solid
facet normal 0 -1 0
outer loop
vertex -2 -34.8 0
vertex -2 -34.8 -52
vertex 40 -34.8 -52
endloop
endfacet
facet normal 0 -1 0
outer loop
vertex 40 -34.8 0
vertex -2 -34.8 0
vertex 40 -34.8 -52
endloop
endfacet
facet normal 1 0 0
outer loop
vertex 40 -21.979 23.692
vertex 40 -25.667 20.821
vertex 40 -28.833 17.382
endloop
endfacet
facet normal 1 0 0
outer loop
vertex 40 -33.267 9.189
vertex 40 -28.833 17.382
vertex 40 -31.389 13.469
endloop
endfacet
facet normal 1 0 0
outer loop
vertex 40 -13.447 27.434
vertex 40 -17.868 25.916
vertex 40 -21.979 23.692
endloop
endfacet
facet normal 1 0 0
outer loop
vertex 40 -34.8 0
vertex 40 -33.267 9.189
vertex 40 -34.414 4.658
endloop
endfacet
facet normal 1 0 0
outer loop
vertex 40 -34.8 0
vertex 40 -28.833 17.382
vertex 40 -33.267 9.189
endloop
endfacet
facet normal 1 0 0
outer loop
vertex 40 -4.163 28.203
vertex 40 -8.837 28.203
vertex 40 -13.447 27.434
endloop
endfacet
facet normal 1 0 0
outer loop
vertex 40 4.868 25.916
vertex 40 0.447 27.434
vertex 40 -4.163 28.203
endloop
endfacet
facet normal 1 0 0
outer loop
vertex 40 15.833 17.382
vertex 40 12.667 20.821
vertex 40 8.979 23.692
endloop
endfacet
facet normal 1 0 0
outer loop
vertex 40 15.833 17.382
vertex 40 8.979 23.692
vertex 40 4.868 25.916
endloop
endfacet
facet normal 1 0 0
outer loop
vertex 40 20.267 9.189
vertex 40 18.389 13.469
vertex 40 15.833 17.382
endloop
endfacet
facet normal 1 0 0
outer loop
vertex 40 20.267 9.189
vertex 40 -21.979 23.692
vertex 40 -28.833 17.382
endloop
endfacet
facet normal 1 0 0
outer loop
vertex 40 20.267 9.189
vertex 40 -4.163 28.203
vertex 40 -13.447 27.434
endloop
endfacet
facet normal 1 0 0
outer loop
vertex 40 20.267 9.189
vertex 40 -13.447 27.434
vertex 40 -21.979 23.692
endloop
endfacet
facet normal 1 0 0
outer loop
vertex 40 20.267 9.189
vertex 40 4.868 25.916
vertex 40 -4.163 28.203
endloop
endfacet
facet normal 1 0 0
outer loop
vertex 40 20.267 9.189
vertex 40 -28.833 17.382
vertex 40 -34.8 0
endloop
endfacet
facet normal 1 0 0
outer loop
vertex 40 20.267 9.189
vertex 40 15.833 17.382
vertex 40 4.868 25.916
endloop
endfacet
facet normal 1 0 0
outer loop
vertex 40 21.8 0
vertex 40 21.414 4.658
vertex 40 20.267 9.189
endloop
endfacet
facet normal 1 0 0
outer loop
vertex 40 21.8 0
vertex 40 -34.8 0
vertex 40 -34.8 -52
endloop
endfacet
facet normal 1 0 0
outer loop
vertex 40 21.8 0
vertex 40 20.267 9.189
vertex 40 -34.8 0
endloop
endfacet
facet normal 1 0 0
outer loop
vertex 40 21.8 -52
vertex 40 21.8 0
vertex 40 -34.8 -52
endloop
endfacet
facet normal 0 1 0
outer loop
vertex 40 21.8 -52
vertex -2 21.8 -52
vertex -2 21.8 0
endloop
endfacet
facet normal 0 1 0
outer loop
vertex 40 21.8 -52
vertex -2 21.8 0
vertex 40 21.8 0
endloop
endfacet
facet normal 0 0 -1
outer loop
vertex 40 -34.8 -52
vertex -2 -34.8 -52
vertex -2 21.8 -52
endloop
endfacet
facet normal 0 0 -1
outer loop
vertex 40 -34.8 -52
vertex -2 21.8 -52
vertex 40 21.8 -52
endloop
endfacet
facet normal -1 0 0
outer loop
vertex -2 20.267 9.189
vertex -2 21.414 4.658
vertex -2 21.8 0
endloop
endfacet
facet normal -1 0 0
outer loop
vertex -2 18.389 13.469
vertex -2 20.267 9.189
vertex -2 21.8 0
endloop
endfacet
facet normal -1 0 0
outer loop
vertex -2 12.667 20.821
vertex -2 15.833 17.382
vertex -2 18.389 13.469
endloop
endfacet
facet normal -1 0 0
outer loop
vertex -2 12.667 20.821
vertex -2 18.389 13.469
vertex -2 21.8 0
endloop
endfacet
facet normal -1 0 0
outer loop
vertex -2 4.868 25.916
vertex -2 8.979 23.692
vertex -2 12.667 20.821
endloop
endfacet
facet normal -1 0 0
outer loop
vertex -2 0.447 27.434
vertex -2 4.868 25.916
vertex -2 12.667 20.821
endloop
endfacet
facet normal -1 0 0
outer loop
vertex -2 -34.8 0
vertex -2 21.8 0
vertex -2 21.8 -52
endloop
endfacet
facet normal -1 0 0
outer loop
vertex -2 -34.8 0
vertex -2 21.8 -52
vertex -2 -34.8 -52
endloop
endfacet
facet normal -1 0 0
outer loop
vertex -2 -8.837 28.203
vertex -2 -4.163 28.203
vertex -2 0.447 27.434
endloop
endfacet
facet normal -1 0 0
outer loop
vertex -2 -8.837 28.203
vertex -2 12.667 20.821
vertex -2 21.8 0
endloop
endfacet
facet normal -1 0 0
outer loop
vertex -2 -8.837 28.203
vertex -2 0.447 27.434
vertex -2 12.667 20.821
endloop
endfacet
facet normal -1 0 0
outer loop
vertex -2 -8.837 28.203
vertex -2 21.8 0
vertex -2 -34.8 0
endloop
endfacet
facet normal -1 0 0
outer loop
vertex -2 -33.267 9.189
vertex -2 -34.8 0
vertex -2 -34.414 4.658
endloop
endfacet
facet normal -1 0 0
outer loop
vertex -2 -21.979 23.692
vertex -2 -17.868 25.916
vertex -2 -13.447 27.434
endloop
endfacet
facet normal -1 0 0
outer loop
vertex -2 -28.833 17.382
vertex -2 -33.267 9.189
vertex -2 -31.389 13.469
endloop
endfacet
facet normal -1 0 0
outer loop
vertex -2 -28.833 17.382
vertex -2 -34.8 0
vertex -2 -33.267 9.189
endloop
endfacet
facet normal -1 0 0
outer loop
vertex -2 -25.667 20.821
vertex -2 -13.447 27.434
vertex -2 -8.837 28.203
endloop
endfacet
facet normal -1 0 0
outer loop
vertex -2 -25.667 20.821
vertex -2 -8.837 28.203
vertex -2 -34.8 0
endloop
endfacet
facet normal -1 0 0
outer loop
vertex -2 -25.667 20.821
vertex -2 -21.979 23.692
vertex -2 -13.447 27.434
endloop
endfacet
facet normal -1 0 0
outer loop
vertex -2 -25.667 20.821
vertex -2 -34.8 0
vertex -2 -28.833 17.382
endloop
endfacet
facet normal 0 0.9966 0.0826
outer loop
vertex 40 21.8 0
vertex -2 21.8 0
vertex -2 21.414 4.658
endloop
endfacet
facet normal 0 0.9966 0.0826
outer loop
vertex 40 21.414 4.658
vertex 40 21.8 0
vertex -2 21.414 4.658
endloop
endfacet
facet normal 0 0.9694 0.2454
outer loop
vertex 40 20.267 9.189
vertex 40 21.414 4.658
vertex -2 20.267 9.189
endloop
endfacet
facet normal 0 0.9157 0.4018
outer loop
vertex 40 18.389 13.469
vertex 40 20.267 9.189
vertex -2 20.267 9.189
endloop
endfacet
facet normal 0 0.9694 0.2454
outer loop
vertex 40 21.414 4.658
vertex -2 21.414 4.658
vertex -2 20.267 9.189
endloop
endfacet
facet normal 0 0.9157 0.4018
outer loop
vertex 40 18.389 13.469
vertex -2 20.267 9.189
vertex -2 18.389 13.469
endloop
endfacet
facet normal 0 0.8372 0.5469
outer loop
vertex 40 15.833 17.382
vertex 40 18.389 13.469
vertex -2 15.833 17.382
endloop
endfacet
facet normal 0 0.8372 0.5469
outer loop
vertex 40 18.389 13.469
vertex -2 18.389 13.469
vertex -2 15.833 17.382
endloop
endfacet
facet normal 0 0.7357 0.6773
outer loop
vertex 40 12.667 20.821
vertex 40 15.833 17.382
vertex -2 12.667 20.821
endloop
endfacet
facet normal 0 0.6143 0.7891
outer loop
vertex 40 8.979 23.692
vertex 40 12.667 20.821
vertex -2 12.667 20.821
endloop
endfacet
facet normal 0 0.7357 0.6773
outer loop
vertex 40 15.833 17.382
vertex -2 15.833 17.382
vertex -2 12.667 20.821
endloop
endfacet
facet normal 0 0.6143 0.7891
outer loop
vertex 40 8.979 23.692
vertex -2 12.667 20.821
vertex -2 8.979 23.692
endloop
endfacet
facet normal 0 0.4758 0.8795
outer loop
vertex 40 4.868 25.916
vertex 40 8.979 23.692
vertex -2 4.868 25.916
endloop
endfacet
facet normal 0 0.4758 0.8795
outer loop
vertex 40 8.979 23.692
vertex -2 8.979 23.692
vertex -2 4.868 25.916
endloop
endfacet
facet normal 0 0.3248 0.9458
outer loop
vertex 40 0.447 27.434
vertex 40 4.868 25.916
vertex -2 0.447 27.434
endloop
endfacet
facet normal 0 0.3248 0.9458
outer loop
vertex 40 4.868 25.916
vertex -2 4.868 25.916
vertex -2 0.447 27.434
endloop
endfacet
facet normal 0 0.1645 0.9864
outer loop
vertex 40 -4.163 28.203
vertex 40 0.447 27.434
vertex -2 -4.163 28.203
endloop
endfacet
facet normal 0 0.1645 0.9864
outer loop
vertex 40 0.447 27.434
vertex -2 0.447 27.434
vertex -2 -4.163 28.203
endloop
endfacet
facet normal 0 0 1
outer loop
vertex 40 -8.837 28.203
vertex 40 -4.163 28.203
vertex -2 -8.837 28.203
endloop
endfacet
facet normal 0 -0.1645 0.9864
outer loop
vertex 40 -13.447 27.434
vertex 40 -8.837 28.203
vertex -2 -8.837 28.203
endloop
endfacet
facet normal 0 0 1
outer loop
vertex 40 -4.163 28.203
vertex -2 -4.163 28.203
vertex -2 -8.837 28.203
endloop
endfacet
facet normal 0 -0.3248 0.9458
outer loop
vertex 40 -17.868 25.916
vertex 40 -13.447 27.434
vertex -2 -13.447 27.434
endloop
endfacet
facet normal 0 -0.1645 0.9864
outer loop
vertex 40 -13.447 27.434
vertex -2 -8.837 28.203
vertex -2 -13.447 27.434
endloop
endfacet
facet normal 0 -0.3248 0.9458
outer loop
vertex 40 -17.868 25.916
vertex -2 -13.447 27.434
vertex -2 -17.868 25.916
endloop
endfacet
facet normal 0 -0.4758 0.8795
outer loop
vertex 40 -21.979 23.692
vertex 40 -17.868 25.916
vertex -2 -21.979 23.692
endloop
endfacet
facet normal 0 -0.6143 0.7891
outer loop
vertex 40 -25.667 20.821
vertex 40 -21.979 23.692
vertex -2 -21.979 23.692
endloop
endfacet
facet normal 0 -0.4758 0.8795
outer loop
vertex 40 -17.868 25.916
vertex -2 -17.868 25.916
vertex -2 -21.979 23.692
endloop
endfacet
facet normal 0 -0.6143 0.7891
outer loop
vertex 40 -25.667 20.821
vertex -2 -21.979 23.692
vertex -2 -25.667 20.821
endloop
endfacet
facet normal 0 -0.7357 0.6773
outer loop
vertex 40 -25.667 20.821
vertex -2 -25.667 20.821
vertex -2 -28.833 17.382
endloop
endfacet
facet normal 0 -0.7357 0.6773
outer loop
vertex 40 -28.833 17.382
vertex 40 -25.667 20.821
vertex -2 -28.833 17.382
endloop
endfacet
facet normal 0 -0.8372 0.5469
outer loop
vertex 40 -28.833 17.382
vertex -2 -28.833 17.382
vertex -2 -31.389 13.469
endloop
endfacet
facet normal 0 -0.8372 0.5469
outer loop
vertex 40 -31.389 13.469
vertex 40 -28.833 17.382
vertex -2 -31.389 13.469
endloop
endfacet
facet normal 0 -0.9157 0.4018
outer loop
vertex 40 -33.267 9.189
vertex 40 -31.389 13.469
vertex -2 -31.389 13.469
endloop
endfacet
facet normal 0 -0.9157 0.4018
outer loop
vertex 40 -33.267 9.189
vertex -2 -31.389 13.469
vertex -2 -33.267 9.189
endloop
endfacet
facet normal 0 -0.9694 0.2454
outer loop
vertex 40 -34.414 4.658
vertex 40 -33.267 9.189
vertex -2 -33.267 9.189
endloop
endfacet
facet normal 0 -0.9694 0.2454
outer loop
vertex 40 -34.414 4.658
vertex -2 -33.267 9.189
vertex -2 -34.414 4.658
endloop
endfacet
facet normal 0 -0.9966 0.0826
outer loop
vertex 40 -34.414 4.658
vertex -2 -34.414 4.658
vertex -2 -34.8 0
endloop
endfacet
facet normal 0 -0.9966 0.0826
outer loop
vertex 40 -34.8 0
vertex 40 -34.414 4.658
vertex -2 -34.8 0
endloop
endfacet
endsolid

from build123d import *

# Parameters (mm, degrees)
CYLINDER002_R     = 28.3
CYLINDER002_DEPTH = 42
BOX004_W          = 42
BOX004_H          = 56.6
BOX004_DEPTH      = 52


with BuildPart() as top_cylinder001:
    # Cylinder002 → Cylinder002 (new body)
    with BuildSketch(Plane(origin=(-2, -6.5, 0), x_dir=(0, 0, -1), z_dir=(1, 0, 0))):
        Circle(CYLINDER002_R)
    extrude(amount=CYLINDER002_DEPTH)


with BuildPart() as bisect_intersect:
    # Box004 → Box004 (new body)
    with BuildSketch(Plane(origin=(-2, 21.8, 0), x_dir=(1, 0, 0), z_dir=(0, 0, -1))):
        with Locations((21, 28.3)):
            Rectangle(BOX004_W, BOX004_H)
    extrude(amount=BOX004_DEPTH)

    # Fusion002: union top cylinder001
    add(top_cylinder001.part)


solid = bisect_intersect.part
